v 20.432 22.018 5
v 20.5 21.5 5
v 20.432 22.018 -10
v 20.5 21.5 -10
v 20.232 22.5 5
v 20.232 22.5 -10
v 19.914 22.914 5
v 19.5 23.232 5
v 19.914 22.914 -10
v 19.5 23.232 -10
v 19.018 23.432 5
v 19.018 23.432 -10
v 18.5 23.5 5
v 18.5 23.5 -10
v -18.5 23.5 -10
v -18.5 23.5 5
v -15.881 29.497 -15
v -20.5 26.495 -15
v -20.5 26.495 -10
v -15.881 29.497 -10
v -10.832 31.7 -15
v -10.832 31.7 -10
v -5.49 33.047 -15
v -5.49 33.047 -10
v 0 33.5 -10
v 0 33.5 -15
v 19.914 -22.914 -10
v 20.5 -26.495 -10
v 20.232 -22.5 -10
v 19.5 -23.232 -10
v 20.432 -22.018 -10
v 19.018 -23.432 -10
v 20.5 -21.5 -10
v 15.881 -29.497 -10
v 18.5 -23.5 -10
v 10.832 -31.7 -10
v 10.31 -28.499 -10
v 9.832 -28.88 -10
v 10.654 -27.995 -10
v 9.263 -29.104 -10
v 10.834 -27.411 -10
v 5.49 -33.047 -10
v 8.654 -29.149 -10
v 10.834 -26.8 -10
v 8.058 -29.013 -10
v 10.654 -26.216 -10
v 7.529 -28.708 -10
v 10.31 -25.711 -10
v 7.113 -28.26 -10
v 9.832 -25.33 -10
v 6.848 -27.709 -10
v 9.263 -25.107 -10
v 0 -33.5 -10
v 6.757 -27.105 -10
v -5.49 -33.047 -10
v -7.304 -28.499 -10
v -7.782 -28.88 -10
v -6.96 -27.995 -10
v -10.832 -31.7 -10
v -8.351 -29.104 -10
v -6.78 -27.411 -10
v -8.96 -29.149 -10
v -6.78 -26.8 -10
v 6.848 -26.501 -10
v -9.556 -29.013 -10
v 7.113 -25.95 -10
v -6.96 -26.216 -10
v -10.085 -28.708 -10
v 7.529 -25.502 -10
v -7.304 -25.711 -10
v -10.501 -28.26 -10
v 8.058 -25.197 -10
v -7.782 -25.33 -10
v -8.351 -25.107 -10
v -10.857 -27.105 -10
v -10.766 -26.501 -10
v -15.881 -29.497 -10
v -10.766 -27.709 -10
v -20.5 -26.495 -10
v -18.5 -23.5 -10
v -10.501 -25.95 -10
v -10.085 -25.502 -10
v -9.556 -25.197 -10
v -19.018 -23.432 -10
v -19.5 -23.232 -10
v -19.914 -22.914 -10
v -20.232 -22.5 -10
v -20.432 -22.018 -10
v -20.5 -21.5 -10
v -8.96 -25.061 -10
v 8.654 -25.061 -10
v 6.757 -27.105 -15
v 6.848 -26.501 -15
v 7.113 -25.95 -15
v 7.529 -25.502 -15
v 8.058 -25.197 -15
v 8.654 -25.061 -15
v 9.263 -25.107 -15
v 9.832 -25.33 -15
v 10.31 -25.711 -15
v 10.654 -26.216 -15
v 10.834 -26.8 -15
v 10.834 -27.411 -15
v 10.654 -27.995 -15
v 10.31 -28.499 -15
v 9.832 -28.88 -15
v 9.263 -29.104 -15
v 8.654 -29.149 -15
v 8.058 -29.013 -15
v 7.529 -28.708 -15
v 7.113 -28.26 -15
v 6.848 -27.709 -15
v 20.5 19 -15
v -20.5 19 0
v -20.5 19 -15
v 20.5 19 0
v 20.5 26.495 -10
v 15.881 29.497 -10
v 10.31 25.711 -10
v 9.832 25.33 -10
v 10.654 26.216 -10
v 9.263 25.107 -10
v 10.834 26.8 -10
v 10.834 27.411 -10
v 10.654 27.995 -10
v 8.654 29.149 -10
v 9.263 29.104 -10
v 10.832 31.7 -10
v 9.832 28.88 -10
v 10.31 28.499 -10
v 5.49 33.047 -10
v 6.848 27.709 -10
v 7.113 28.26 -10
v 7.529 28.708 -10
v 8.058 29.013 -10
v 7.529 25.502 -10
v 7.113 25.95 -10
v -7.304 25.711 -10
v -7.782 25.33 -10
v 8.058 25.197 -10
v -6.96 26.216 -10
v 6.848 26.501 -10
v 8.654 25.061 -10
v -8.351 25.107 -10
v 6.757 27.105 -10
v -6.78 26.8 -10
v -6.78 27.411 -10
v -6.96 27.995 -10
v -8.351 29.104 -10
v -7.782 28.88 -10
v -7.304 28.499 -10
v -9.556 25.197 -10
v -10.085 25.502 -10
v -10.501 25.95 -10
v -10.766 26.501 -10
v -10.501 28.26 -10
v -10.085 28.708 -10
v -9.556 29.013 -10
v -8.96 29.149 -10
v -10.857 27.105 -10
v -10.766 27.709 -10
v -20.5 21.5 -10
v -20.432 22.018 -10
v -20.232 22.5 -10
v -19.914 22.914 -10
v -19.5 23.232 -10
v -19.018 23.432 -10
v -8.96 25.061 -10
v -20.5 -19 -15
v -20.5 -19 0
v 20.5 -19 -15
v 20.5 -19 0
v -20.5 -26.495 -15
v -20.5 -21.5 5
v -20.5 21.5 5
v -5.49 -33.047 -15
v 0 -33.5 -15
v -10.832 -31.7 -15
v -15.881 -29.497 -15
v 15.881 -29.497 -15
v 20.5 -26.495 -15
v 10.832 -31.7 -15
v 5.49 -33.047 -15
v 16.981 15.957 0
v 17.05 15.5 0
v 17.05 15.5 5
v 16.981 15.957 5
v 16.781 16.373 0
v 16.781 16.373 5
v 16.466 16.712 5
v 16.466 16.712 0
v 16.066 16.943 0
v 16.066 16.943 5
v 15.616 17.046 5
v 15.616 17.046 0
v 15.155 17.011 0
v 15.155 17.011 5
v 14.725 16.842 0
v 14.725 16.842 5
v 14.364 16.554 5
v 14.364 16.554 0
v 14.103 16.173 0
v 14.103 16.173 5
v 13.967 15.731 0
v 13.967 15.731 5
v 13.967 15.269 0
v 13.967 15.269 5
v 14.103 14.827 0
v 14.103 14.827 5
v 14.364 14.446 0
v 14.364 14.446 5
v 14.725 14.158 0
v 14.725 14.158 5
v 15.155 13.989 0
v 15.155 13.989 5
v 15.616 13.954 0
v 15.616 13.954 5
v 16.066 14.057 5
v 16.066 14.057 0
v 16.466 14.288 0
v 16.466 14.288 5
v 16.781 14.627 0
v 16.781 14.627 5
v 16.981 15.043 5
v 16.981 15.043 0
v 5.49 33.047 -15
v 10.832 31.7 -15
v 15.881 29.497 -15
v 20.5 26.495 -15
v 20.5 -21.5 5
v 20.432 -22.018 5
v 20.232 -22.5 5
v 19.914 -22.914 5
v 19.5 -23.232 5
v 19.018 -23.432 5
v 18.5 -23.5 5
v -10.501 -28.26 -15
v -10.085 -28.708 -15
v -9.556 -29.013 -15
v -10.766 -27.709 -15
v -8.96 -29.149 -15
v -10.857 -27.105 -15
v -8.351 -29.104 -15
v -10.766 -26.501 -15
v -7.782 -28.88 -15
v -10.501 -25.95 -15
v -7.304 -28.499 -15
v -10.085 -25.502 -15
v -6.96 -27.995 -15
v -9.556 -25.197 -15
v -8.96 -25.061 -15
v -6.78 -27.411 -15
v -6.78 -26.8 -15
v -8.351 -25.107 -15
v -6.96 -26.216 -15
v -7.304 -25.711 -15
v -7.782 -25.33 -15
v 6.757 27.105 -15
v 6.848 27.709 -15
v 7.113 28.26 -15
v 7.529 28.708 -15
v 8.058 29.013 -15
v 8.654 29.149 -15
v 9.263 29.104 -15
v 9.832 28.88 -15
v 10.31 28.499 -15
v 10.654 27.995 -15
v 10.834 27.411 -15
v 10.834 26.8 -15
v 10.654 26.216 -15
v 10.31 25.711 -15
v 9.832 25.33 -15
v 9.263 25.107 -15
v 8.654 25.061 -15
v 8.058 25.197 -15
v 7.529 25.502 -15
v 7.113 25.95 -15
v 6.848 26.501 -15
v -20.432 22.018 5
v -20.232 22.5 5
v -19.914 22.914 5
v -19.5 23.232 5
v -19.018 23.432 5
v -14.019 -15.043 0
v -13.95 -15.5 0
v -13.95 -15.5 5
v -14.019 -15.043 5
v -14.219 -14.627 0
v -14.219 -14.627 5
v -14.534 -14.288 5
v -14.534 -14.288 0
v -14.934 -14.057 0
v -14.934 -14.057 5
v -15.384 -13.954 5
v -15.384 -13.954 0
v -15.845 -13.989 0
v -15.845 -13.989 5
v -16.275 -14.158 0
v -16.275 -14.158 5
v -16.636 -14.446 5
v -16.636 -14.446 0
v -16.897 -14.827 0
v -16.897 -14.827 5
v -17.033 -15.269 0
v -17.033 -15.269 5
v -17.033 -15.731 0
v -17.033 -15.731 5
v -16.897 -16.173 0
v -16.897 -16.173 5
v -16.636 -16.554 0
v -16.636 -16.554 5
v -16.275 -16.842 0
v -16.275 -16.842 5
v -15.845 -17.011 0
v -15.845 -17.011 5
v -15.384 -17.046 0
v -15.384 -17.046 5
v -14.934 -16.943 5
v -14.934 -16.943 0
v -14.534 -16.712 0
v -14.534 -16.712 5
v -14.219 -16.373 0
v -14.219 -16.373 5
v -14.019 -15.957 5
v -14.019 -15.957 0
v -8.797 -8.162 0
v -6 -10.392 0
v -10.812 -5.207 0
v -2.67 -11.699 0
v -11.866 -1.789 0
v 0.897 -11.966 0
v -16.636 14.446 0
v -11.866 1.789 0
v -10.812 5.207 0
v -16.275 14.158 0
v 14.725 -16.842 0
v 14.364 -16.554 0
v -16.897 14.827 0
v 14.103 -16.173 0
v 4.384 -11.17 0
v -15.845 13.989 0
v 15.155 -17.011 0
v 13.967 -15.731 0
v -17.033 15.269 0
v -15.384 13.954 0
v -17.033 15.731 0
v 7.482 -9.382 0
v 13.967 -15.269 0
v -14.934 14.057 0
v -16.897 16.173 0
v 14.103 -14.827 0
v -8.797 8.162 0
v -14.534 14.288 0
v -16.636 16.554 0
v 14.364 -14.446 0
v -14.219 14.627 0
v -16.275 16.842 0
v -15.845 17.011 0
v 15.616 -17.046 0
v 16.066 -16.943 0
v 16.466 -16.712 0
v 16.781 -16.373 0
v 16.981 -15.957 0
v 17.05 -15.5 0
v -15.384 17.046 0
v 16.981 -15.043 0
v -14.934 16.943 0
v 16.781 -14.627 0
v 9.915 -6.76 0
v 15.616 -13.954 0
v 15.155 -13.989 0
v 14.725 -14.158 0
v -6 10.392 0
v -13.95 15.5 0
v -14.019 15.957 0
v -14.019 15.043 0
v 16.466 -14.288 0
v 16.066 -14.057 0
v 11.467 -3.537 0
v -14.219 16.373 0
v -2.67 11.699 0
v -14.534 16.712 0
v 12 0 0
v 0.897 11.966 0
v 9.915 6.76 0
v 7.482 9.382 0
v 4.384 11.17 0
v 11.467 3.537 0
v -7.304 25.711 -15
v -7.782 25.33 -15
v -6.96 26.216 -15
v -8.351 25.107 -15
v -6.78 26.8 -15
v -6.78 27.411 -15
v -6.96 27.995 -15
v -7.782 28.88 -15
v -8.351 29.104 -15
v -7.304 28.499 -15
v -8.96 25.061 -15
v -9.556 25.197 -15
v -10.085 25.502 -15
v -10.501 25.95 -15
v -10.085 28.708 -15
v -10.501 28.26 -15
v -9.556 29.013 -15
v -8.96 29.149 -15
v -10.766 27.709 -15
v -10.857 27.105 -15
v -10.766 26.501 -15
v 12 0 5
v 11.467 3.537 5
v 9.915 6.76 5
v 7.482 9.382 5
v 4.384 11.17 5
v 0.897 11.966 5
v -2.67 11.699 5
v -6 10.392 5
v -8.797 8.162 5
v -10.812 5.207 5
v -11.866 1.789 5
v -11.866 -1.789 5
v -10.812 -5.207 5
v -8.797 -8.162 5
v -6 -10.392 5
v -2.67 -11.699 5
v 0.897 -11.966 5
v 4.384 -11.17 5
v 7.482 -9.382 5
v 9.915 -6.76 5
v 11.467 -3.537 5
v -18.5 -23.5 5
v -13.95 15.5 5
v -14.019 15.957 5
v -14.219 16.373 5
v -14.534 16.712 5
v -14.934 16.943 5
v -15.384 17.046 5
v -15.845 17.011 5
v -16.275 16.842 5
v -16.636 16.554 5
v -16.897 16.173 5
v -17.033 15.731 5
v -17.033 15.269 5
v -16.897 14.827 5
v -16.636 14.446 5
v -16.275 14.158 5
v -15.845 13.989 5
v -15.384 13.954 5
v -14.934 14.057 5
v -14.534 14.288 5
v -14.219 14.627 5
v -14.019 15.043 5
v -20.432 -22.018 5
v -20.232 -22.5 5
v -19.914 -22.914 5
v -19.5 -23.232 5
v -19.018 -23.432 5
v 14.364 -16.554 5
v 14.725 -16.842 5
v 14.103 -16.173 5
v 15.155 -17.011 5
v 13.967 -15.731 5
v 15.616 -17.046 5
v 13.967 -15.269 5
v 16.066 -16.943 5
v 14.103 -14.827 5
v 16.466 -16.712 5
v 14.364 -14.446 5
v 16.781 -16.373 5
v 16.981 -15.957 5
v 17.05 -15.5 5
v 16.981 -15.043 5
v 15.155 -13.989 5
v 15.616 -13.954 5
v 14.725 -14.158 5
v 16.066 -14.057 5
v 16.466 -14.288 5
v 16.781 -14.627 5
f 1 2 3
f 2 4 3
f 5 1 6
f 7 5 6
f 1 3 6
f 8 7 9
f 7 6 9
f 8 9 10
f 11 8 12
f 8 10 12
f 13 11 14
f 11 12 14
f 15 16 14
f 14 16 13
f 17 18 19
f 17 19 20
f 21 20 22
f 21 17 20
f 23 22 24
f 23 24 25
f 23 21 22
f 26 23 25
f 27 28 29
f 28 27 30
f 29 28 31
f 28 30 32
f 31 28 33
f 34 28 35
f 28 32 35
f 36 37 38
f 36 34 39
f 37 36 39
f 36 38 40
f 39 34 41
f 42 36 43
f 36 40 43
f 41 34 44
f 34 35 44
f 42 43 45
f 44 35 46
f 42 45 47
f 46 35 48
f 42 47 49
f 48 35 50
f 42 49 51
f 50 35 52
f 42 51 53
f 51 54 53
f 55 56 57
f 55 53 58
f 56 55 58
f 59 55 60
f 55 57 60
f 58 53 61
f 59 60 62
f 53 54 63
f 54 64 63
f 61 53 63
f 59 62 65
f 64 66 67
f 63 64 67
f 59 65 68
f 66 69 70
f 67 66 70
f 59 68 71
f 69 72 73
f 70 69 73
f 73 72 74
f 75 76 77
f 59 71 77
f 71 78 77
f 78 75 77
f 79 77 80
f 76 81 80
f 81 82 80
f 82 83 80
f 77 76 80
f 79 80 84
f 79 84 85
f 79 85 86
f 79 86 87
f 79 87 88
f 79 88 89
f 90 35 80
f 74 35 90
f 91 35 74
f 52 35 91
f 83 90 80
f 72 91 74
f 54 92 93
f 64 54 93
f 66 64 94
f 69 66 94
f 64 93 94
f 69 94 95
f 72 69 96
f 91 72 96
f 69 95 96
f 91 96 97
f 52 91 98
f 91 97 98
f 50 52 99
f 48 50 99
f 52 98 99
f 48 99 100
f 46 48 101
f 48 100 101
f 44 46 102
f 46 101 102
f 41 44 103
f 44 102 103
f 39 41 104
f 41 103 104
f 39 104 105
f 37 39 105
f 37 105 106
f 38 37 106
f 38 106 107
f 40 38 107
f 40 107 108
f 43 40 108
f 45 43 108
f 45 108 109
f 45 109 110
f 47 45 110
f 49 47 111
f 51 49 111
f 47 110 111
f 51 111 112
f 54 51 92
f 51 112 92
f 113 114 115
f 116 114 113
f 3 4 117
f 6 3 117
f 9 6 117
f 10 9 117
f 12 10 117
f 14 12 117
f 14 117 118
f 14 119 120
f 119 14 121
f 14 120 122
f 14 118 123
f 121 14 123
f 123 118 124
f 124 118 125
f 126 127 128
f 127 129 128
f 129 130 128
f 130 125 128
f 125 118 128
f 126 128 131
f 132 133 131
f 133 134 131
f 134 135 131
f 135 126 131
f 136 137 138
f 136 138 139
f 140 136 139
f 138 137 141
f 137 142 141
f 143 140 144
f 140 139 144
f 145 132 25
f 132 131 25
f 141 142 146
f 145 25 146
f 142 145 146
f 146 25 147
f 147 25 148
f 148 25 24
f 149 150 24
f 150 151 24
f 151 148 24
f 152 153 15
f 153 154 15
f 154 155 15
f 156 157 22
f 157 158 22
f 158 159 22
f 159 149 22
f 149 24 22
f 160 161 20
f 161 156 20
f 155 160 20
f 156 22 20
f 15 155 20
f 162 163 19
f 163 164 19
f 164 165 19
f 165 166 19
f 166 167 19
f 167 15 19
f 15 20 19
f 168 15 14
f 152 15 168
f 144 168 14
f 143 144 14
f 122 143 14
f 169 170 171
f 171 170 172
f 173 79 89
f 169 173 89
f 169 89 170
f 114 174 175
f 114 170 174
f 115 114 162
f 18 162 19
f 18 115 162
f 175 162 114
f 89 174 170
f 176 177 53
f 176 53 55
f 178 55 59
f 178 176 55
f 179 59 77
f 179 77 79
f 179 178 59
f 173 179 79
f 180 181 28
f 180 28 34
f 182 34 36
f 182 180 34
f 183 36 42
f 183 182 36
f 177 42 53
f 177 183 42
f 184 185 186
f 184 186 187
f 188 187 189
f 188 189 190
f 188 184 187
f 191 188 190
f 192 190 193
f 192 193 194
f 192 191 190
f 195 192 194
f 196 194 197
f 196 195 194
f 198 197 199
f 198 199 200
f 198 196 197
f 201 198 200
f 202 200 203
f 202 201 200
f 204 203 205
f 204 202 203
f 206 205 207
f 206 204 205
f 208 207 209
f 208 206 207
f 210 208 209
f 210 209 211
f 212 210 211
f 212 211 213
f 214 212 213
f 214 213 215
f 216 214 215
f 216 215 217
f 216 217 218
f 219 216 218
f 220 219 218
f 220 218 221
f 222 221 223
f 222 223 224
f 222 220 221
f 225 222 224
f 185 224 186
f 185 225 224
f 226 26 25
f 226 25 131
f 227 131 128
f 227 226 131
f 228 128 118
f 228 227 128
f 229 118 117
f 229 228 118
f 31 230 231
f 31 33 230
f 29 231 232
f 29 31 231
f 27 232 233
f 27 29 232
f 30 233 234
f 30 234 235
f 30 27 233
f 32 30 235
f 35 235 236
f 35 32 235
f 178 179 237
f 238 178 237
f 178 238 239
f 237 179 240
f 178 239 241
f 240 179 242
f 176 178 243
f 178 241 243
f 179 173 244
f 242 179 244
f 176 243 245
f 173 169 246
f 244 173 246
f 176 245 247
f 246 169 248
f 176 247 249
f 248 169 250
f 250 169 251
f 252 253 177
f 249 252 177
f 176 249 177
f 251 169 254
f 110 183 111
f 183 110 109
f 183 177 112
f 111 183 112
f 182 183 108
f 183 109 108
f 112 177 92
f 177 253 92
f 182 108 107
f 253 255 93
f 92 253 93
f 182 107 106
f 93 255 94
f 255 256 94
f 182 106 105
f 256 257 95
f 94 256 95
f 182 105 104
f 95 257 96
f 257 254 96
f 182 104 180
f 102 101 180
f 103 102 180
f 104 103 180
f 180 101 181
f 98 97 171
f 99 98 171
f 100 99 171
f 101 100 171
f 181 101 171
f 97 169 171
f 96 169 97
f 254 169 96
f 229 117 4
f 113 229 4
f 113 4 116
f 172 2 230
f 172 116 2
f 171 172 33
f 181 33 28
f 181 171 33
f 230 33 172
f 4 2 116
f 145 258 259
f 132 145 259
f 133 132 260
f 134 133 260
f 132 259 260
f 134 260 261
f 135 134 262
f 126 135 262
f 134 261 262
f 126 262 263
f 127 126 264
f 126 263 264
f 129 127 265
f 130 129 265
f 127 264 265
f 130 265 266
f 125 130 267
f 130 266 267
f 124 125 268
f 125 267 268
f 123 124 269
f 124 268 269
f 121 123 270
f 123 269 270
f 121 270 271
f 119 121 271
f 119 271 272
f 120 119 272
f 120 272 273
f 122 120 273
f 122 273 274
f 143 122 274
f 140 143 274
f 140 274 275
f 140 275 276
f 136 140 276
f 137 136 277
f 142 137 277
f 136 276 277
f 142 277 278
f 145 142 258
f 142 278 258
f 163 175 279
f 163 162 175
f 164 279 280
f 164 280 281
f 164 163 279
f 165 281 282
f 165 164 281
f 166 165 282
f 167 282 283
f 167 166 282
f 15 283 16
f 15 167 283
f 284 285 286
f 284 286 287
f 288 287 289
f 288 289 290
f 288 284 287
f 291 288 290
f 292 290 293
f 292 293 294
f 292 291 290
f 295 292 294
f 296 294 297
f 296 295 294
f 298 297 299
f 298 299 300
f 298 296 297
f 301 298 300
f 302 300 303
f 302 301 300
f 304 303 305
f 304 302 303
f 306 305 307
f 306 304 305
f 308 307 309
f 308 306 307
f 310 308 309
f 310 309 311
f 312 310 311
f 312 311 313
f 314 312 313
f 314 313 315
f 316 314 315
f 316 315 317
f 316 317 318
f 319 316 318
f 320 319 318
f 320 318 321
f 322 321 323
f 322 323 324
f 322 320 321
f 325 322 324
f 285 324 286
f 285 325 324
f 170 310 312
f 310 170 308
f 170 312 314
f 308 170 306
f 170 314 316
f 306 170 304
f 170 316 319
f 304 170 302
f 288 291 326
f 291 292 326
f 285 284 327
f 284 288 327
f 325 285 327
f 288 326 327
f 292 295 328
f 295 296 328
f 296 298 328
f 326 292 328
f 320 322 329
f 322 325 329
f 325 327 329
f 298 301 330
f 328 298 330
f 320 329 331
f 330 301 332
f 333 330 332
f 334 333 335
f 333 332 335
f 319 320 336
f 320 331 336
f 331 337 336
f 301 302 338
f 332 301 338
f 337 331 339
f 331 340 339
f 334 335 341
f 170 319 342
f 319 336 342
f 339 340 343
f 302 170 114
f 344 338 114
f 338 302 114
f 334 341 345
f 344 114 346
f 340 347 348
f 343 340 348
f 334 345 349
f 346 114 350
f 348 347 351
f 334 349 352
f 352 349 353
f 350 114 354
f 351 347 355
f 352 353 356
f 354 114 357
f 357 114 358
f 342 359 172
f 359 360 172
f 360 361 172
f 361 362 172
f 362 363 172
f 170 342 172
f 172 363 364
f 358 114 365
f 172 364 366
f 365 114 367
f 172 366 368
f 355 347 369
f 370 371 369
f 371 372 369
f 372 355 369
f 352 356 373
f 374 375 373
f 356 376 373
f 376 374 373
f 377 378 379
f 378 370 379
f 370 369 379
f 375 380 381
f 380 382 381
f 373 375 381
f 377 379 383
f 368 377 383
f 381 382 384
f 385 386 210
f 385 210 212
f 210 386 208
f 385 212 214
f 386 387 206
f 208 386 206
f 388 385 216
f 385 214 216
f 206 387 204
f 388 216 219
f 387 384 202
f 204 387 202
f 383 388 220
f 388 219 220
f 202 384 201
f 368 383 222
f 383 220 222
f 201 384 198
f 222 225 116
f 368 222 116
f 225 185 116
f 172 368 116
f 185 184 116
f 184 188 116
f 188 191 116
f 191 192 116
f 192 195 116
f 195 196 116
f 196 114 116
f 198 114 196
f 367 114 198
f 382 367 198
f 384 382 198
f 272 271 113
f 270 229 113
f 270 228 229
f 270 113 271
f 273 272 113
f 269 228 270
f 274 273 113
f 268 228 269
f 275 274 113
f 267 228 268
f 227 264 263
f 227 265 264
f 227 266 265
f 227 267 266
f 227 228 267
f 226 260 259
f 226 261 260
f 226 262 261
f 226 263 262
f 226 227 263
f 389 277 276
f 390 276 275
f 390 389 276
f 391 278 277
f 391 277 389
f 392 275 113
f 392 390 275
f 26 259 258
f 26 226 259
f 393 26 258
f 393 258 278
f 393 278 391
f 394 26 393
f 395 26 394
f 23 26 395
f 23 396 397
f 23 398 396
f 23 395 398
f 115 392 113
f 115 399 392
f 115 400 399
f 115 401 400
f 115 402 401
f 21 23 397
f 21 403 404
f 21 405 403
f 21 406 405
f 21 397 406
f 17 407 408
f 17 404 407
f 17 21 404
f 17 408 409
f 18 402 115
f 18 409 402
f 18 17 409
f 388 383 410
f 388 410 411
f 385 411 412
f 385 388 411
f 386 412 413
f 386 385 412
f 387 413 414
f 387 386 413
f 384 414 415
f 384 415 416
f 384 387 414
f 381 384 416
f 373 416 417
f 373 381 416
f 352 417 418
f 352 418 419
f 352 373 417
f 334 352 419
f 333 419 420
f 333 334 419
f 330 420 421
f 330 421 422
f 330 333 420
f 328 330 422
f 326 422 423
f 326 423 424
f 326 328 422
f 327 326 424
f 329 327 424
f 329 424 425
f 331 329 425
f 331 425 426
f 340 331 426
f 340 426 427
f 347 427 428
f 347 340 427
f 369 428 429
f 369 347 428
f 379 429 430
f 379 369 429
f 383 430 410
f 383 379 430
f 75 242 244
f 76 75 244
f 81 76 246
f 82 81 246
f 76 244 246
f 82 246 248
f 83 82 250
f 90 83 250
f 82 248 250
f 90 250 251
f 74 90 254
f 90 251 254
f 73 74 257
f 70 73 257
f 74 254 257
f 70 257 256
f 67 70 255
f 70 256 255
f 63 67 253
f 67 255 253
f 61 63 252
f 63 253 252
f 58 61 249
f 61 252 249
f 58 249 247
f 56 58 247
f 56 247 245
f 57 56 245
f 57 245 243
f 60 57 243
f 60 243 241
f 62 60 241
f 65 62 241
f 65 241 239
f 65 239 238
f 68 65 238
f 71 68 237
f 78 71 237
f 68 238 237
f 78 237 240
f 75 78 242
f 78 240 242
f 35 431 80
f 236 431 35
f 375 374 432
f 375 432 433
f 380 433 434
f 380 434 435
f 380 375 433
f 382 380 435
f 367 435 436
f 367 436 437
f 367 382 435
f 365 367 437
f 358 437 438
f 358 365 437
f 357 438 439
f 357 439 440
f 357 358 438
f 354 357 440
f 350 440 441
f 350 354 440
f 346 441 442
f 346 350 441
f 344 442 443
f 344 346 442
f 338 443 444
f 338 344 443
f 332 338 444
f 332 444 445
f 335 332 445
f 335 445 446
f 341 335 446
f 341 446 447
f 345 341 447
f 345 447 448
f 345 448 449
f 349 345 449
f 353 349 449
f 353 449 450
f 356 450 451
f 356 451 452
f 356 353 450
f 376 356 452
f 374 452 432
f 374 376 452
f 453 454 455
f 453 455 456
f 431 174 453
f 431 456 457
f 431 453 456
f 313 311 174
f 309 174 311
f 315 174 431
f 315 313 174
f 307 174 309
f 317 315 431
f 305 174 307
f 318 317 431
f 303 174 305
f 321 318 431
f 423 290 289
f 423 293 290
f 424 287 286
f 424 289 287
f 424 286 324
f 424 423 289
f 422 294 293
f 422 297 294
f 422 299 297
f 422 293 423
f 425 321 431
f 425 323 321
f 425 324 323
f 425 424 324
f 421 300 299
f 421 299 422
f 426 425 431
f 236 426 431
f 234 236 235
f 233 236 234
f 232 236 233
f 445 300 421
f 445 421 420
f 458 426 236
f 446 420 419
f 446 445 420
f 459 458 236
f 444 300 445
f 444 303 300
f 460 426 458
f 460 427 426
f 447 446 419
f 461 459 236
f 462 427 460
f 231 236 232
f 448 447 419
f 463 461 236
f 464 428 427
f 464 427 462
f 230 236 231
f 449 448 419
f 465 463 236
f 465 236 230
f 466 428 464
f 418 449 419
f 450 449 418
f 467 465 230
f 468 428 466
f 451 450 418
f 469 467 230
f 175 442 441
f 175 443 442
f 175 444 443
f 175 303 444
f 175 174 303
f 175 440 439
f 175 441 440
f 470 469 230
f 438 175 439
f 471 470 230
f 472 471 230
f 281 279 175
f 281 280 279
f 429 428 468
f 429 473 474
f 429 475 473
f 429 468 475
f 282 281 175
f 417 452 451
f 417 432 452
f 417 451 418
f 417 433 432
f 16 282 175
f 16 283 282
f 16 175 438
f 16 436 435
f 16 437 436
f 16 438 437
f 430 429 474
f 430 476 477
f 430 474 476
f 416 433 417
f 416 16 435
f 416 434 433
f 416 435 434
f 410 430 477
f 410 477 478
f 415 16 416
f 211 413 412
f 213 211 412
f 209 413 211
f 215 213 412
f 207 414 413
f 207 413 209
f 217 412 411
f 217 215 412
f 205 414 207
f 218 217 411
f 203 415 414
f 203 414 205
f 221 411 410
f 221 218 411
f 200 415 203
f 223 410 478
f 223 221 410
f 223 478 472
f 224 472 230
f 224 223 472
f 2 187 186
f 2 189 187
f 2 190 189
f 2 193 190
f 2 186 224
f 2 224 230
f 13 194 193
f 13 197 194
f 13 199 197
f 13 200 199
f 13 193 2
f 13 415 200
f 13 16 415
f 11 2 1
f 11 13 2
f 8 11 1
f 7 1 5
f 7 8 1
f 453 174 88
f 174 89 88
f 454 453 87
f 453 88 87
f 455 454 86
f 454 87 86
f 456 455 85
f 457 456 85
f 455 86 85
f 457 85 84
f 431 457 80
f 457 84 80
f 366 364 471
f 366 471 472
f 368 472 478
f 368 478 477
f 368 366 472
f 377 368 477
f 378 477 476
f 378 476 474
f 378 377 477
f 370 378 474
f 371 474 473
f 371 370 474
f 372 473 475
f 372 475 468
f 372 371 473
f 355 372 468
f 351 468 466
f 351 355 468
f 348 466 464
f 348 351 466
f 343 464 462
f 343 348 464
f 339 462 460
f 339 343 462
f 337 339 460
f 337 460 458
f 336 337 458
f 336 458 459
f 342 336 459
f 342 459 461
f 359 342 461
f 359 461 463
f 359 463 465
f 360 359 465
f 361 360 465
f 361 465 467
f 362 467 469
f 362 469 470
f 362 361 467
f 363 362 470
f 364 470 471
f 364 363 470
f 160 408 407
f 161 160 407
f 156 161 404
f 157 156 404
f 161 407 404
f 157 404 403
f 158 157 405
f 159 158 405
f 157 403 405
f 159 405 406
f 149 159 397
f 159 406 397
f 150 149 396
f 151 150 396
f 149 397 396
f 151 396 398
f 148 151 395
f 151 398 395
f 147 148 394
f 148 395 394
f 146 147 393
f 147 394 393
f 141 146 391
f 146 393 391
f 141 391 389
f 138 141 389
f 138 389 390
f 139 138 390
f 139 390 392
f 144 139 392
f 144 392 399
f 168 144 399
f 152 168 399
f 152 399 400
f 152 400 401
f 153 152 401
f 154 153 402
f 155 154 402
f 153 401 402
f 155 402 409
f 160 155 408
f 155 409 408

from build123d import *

# Parameters (mm, degrees)
SKETCH1_W           = 41
SKETCH1_H           = 38
SKETCH1_R           = 1.55
SKETCH1_R_2         = 12
BOSS_EXTRUDE1_DEPTH = 5
SKETCH2_W           = 41
SKETCH2_H           = 4.5
BOSS_EXTRUDE2_DEPTH = 20
SKETCH3_R           = 2.05
BOSS_EXTRUDE3_DEPTH = 5
FILLET1_R           = 2


with BuildPart() as part:
    # Sketch1 → Boss-Extrude1 (new body)
    with BuildSketch(Plane.XY):
        Rectangle(SKETCH1_W, SKETCH1_H)
        with Locations((15.5, 15.5)):
            Circle(SKETCH1_R, mode=Mode.SUBTRACT)
        with Locations((-15.5, 15.5)):
            Circle(SKETCH1_R, mode=Mode.SUBTRACT)
        with Locations((15.5, -15.5)):
            Circle(SKETCH1_R, mode=Mode.SUBTRACT)
        with Locations((-15.5, -15.5)):
            Circle(SKETCH1_R, mode=Mode.SUBTRACT)
        Circle(SKETCH1_R_2, mode=Mode.SUBTRACT)
    extrude(amount=BOSS_EXTRUDE1_DEPTH)

    # Sketch2 → Boss-Extrude2 (add)
    with BuildSketch(Plane.XY.offset(5)):
        with Locations((0, 21.25)):
            Rectangle(SKETCH2_W, SKETCH2_H)
        with Locations((0, -21.25)):
            Rectangle(SKETCH2_W, SKETCH2_H)
    extrude(amount=-BOSS_EXTRUDE2_DEPTH)

    # Sketch3 → Boss-Extrude3 (add)
    # profile 1 of 2: a face of its own
    with BuildSketch(Plane(origin=(0, 0, -15), x_dir=(-1, 0, 0), z_dir=(0, 0, -1))):
        with BuildLine():
            Line((-20.5, 26.495282599), (-20.5, 23.5))
            Line((-20.5, 23.5), (20.5, 23.5))
            Line((20.5, 23.5), (20.5, 26.495282599))
            ThreePointArc((20.5, 26.495282599), (10.831851903, 31.700488708), (-7.9e-08, 33.5))
            ThreePointArc((-7.9e-08, 33.5), (-10.831851978, 31.700488683), (-20.5, 26.495282599))
        make_face()
        with Locations((-8.80698434, 27.105110714)):
            Circle(SKETCH3_R, mode=Mode.SUBTRACT)
        with Locations((8.80698434, 27.105110714)):
            Circle(SKETCH3_R, mode=Mode.SUBTRACT)
    # profile 2 of 2: a face of its own
    with BuildSketch(Plane(origin=(0, 0, -15), x_dir=(-1, 0, 0), z_dir=(0, 0, -1))):
        with BuildLine():
            Line((-20.5, -23.5), (-20.5, -26.495282599))
            ThreePointArc((-20.5, -26.495282599), (-10.831851978, -31.700488683), (-7.9e-08, -33.5))
            ThreePointArc((-7.9e-08, -33.5), (10.831851903, -31.700488708), (20.5, -26.495282599))
            Line((20.5, -26.495282599), (20.5, -23.5))
            Line((20.5, -23.5), (-20.5, -23.5))
        make_face()
        with Locations((-8.80698434, -27.105110714)):
            Circle(SKETCH3_R, mode=Mode.SUBTRACT)
        with Locations((8.80698434, -27.105110714)):
            Circle(SKETCH3_R, mode=Mode.SUBTRACT)
    extrude(amount=-BOSS_EXTRUDE3_DEPTH)

    # Fillet1
    fillet1_edges = [part.edges().sort_by_distance(p)[0] for p in [
        (20.5, 23.5, -2.5),
        (-20.5, 23.5, -2.5),
        (-20.5, -23.5, -2.5),
        (20.5, -23.5, -2.5),
    ]]
    fillet(fillet1_edges, radius=FILLET1_R)


solid = part.part
